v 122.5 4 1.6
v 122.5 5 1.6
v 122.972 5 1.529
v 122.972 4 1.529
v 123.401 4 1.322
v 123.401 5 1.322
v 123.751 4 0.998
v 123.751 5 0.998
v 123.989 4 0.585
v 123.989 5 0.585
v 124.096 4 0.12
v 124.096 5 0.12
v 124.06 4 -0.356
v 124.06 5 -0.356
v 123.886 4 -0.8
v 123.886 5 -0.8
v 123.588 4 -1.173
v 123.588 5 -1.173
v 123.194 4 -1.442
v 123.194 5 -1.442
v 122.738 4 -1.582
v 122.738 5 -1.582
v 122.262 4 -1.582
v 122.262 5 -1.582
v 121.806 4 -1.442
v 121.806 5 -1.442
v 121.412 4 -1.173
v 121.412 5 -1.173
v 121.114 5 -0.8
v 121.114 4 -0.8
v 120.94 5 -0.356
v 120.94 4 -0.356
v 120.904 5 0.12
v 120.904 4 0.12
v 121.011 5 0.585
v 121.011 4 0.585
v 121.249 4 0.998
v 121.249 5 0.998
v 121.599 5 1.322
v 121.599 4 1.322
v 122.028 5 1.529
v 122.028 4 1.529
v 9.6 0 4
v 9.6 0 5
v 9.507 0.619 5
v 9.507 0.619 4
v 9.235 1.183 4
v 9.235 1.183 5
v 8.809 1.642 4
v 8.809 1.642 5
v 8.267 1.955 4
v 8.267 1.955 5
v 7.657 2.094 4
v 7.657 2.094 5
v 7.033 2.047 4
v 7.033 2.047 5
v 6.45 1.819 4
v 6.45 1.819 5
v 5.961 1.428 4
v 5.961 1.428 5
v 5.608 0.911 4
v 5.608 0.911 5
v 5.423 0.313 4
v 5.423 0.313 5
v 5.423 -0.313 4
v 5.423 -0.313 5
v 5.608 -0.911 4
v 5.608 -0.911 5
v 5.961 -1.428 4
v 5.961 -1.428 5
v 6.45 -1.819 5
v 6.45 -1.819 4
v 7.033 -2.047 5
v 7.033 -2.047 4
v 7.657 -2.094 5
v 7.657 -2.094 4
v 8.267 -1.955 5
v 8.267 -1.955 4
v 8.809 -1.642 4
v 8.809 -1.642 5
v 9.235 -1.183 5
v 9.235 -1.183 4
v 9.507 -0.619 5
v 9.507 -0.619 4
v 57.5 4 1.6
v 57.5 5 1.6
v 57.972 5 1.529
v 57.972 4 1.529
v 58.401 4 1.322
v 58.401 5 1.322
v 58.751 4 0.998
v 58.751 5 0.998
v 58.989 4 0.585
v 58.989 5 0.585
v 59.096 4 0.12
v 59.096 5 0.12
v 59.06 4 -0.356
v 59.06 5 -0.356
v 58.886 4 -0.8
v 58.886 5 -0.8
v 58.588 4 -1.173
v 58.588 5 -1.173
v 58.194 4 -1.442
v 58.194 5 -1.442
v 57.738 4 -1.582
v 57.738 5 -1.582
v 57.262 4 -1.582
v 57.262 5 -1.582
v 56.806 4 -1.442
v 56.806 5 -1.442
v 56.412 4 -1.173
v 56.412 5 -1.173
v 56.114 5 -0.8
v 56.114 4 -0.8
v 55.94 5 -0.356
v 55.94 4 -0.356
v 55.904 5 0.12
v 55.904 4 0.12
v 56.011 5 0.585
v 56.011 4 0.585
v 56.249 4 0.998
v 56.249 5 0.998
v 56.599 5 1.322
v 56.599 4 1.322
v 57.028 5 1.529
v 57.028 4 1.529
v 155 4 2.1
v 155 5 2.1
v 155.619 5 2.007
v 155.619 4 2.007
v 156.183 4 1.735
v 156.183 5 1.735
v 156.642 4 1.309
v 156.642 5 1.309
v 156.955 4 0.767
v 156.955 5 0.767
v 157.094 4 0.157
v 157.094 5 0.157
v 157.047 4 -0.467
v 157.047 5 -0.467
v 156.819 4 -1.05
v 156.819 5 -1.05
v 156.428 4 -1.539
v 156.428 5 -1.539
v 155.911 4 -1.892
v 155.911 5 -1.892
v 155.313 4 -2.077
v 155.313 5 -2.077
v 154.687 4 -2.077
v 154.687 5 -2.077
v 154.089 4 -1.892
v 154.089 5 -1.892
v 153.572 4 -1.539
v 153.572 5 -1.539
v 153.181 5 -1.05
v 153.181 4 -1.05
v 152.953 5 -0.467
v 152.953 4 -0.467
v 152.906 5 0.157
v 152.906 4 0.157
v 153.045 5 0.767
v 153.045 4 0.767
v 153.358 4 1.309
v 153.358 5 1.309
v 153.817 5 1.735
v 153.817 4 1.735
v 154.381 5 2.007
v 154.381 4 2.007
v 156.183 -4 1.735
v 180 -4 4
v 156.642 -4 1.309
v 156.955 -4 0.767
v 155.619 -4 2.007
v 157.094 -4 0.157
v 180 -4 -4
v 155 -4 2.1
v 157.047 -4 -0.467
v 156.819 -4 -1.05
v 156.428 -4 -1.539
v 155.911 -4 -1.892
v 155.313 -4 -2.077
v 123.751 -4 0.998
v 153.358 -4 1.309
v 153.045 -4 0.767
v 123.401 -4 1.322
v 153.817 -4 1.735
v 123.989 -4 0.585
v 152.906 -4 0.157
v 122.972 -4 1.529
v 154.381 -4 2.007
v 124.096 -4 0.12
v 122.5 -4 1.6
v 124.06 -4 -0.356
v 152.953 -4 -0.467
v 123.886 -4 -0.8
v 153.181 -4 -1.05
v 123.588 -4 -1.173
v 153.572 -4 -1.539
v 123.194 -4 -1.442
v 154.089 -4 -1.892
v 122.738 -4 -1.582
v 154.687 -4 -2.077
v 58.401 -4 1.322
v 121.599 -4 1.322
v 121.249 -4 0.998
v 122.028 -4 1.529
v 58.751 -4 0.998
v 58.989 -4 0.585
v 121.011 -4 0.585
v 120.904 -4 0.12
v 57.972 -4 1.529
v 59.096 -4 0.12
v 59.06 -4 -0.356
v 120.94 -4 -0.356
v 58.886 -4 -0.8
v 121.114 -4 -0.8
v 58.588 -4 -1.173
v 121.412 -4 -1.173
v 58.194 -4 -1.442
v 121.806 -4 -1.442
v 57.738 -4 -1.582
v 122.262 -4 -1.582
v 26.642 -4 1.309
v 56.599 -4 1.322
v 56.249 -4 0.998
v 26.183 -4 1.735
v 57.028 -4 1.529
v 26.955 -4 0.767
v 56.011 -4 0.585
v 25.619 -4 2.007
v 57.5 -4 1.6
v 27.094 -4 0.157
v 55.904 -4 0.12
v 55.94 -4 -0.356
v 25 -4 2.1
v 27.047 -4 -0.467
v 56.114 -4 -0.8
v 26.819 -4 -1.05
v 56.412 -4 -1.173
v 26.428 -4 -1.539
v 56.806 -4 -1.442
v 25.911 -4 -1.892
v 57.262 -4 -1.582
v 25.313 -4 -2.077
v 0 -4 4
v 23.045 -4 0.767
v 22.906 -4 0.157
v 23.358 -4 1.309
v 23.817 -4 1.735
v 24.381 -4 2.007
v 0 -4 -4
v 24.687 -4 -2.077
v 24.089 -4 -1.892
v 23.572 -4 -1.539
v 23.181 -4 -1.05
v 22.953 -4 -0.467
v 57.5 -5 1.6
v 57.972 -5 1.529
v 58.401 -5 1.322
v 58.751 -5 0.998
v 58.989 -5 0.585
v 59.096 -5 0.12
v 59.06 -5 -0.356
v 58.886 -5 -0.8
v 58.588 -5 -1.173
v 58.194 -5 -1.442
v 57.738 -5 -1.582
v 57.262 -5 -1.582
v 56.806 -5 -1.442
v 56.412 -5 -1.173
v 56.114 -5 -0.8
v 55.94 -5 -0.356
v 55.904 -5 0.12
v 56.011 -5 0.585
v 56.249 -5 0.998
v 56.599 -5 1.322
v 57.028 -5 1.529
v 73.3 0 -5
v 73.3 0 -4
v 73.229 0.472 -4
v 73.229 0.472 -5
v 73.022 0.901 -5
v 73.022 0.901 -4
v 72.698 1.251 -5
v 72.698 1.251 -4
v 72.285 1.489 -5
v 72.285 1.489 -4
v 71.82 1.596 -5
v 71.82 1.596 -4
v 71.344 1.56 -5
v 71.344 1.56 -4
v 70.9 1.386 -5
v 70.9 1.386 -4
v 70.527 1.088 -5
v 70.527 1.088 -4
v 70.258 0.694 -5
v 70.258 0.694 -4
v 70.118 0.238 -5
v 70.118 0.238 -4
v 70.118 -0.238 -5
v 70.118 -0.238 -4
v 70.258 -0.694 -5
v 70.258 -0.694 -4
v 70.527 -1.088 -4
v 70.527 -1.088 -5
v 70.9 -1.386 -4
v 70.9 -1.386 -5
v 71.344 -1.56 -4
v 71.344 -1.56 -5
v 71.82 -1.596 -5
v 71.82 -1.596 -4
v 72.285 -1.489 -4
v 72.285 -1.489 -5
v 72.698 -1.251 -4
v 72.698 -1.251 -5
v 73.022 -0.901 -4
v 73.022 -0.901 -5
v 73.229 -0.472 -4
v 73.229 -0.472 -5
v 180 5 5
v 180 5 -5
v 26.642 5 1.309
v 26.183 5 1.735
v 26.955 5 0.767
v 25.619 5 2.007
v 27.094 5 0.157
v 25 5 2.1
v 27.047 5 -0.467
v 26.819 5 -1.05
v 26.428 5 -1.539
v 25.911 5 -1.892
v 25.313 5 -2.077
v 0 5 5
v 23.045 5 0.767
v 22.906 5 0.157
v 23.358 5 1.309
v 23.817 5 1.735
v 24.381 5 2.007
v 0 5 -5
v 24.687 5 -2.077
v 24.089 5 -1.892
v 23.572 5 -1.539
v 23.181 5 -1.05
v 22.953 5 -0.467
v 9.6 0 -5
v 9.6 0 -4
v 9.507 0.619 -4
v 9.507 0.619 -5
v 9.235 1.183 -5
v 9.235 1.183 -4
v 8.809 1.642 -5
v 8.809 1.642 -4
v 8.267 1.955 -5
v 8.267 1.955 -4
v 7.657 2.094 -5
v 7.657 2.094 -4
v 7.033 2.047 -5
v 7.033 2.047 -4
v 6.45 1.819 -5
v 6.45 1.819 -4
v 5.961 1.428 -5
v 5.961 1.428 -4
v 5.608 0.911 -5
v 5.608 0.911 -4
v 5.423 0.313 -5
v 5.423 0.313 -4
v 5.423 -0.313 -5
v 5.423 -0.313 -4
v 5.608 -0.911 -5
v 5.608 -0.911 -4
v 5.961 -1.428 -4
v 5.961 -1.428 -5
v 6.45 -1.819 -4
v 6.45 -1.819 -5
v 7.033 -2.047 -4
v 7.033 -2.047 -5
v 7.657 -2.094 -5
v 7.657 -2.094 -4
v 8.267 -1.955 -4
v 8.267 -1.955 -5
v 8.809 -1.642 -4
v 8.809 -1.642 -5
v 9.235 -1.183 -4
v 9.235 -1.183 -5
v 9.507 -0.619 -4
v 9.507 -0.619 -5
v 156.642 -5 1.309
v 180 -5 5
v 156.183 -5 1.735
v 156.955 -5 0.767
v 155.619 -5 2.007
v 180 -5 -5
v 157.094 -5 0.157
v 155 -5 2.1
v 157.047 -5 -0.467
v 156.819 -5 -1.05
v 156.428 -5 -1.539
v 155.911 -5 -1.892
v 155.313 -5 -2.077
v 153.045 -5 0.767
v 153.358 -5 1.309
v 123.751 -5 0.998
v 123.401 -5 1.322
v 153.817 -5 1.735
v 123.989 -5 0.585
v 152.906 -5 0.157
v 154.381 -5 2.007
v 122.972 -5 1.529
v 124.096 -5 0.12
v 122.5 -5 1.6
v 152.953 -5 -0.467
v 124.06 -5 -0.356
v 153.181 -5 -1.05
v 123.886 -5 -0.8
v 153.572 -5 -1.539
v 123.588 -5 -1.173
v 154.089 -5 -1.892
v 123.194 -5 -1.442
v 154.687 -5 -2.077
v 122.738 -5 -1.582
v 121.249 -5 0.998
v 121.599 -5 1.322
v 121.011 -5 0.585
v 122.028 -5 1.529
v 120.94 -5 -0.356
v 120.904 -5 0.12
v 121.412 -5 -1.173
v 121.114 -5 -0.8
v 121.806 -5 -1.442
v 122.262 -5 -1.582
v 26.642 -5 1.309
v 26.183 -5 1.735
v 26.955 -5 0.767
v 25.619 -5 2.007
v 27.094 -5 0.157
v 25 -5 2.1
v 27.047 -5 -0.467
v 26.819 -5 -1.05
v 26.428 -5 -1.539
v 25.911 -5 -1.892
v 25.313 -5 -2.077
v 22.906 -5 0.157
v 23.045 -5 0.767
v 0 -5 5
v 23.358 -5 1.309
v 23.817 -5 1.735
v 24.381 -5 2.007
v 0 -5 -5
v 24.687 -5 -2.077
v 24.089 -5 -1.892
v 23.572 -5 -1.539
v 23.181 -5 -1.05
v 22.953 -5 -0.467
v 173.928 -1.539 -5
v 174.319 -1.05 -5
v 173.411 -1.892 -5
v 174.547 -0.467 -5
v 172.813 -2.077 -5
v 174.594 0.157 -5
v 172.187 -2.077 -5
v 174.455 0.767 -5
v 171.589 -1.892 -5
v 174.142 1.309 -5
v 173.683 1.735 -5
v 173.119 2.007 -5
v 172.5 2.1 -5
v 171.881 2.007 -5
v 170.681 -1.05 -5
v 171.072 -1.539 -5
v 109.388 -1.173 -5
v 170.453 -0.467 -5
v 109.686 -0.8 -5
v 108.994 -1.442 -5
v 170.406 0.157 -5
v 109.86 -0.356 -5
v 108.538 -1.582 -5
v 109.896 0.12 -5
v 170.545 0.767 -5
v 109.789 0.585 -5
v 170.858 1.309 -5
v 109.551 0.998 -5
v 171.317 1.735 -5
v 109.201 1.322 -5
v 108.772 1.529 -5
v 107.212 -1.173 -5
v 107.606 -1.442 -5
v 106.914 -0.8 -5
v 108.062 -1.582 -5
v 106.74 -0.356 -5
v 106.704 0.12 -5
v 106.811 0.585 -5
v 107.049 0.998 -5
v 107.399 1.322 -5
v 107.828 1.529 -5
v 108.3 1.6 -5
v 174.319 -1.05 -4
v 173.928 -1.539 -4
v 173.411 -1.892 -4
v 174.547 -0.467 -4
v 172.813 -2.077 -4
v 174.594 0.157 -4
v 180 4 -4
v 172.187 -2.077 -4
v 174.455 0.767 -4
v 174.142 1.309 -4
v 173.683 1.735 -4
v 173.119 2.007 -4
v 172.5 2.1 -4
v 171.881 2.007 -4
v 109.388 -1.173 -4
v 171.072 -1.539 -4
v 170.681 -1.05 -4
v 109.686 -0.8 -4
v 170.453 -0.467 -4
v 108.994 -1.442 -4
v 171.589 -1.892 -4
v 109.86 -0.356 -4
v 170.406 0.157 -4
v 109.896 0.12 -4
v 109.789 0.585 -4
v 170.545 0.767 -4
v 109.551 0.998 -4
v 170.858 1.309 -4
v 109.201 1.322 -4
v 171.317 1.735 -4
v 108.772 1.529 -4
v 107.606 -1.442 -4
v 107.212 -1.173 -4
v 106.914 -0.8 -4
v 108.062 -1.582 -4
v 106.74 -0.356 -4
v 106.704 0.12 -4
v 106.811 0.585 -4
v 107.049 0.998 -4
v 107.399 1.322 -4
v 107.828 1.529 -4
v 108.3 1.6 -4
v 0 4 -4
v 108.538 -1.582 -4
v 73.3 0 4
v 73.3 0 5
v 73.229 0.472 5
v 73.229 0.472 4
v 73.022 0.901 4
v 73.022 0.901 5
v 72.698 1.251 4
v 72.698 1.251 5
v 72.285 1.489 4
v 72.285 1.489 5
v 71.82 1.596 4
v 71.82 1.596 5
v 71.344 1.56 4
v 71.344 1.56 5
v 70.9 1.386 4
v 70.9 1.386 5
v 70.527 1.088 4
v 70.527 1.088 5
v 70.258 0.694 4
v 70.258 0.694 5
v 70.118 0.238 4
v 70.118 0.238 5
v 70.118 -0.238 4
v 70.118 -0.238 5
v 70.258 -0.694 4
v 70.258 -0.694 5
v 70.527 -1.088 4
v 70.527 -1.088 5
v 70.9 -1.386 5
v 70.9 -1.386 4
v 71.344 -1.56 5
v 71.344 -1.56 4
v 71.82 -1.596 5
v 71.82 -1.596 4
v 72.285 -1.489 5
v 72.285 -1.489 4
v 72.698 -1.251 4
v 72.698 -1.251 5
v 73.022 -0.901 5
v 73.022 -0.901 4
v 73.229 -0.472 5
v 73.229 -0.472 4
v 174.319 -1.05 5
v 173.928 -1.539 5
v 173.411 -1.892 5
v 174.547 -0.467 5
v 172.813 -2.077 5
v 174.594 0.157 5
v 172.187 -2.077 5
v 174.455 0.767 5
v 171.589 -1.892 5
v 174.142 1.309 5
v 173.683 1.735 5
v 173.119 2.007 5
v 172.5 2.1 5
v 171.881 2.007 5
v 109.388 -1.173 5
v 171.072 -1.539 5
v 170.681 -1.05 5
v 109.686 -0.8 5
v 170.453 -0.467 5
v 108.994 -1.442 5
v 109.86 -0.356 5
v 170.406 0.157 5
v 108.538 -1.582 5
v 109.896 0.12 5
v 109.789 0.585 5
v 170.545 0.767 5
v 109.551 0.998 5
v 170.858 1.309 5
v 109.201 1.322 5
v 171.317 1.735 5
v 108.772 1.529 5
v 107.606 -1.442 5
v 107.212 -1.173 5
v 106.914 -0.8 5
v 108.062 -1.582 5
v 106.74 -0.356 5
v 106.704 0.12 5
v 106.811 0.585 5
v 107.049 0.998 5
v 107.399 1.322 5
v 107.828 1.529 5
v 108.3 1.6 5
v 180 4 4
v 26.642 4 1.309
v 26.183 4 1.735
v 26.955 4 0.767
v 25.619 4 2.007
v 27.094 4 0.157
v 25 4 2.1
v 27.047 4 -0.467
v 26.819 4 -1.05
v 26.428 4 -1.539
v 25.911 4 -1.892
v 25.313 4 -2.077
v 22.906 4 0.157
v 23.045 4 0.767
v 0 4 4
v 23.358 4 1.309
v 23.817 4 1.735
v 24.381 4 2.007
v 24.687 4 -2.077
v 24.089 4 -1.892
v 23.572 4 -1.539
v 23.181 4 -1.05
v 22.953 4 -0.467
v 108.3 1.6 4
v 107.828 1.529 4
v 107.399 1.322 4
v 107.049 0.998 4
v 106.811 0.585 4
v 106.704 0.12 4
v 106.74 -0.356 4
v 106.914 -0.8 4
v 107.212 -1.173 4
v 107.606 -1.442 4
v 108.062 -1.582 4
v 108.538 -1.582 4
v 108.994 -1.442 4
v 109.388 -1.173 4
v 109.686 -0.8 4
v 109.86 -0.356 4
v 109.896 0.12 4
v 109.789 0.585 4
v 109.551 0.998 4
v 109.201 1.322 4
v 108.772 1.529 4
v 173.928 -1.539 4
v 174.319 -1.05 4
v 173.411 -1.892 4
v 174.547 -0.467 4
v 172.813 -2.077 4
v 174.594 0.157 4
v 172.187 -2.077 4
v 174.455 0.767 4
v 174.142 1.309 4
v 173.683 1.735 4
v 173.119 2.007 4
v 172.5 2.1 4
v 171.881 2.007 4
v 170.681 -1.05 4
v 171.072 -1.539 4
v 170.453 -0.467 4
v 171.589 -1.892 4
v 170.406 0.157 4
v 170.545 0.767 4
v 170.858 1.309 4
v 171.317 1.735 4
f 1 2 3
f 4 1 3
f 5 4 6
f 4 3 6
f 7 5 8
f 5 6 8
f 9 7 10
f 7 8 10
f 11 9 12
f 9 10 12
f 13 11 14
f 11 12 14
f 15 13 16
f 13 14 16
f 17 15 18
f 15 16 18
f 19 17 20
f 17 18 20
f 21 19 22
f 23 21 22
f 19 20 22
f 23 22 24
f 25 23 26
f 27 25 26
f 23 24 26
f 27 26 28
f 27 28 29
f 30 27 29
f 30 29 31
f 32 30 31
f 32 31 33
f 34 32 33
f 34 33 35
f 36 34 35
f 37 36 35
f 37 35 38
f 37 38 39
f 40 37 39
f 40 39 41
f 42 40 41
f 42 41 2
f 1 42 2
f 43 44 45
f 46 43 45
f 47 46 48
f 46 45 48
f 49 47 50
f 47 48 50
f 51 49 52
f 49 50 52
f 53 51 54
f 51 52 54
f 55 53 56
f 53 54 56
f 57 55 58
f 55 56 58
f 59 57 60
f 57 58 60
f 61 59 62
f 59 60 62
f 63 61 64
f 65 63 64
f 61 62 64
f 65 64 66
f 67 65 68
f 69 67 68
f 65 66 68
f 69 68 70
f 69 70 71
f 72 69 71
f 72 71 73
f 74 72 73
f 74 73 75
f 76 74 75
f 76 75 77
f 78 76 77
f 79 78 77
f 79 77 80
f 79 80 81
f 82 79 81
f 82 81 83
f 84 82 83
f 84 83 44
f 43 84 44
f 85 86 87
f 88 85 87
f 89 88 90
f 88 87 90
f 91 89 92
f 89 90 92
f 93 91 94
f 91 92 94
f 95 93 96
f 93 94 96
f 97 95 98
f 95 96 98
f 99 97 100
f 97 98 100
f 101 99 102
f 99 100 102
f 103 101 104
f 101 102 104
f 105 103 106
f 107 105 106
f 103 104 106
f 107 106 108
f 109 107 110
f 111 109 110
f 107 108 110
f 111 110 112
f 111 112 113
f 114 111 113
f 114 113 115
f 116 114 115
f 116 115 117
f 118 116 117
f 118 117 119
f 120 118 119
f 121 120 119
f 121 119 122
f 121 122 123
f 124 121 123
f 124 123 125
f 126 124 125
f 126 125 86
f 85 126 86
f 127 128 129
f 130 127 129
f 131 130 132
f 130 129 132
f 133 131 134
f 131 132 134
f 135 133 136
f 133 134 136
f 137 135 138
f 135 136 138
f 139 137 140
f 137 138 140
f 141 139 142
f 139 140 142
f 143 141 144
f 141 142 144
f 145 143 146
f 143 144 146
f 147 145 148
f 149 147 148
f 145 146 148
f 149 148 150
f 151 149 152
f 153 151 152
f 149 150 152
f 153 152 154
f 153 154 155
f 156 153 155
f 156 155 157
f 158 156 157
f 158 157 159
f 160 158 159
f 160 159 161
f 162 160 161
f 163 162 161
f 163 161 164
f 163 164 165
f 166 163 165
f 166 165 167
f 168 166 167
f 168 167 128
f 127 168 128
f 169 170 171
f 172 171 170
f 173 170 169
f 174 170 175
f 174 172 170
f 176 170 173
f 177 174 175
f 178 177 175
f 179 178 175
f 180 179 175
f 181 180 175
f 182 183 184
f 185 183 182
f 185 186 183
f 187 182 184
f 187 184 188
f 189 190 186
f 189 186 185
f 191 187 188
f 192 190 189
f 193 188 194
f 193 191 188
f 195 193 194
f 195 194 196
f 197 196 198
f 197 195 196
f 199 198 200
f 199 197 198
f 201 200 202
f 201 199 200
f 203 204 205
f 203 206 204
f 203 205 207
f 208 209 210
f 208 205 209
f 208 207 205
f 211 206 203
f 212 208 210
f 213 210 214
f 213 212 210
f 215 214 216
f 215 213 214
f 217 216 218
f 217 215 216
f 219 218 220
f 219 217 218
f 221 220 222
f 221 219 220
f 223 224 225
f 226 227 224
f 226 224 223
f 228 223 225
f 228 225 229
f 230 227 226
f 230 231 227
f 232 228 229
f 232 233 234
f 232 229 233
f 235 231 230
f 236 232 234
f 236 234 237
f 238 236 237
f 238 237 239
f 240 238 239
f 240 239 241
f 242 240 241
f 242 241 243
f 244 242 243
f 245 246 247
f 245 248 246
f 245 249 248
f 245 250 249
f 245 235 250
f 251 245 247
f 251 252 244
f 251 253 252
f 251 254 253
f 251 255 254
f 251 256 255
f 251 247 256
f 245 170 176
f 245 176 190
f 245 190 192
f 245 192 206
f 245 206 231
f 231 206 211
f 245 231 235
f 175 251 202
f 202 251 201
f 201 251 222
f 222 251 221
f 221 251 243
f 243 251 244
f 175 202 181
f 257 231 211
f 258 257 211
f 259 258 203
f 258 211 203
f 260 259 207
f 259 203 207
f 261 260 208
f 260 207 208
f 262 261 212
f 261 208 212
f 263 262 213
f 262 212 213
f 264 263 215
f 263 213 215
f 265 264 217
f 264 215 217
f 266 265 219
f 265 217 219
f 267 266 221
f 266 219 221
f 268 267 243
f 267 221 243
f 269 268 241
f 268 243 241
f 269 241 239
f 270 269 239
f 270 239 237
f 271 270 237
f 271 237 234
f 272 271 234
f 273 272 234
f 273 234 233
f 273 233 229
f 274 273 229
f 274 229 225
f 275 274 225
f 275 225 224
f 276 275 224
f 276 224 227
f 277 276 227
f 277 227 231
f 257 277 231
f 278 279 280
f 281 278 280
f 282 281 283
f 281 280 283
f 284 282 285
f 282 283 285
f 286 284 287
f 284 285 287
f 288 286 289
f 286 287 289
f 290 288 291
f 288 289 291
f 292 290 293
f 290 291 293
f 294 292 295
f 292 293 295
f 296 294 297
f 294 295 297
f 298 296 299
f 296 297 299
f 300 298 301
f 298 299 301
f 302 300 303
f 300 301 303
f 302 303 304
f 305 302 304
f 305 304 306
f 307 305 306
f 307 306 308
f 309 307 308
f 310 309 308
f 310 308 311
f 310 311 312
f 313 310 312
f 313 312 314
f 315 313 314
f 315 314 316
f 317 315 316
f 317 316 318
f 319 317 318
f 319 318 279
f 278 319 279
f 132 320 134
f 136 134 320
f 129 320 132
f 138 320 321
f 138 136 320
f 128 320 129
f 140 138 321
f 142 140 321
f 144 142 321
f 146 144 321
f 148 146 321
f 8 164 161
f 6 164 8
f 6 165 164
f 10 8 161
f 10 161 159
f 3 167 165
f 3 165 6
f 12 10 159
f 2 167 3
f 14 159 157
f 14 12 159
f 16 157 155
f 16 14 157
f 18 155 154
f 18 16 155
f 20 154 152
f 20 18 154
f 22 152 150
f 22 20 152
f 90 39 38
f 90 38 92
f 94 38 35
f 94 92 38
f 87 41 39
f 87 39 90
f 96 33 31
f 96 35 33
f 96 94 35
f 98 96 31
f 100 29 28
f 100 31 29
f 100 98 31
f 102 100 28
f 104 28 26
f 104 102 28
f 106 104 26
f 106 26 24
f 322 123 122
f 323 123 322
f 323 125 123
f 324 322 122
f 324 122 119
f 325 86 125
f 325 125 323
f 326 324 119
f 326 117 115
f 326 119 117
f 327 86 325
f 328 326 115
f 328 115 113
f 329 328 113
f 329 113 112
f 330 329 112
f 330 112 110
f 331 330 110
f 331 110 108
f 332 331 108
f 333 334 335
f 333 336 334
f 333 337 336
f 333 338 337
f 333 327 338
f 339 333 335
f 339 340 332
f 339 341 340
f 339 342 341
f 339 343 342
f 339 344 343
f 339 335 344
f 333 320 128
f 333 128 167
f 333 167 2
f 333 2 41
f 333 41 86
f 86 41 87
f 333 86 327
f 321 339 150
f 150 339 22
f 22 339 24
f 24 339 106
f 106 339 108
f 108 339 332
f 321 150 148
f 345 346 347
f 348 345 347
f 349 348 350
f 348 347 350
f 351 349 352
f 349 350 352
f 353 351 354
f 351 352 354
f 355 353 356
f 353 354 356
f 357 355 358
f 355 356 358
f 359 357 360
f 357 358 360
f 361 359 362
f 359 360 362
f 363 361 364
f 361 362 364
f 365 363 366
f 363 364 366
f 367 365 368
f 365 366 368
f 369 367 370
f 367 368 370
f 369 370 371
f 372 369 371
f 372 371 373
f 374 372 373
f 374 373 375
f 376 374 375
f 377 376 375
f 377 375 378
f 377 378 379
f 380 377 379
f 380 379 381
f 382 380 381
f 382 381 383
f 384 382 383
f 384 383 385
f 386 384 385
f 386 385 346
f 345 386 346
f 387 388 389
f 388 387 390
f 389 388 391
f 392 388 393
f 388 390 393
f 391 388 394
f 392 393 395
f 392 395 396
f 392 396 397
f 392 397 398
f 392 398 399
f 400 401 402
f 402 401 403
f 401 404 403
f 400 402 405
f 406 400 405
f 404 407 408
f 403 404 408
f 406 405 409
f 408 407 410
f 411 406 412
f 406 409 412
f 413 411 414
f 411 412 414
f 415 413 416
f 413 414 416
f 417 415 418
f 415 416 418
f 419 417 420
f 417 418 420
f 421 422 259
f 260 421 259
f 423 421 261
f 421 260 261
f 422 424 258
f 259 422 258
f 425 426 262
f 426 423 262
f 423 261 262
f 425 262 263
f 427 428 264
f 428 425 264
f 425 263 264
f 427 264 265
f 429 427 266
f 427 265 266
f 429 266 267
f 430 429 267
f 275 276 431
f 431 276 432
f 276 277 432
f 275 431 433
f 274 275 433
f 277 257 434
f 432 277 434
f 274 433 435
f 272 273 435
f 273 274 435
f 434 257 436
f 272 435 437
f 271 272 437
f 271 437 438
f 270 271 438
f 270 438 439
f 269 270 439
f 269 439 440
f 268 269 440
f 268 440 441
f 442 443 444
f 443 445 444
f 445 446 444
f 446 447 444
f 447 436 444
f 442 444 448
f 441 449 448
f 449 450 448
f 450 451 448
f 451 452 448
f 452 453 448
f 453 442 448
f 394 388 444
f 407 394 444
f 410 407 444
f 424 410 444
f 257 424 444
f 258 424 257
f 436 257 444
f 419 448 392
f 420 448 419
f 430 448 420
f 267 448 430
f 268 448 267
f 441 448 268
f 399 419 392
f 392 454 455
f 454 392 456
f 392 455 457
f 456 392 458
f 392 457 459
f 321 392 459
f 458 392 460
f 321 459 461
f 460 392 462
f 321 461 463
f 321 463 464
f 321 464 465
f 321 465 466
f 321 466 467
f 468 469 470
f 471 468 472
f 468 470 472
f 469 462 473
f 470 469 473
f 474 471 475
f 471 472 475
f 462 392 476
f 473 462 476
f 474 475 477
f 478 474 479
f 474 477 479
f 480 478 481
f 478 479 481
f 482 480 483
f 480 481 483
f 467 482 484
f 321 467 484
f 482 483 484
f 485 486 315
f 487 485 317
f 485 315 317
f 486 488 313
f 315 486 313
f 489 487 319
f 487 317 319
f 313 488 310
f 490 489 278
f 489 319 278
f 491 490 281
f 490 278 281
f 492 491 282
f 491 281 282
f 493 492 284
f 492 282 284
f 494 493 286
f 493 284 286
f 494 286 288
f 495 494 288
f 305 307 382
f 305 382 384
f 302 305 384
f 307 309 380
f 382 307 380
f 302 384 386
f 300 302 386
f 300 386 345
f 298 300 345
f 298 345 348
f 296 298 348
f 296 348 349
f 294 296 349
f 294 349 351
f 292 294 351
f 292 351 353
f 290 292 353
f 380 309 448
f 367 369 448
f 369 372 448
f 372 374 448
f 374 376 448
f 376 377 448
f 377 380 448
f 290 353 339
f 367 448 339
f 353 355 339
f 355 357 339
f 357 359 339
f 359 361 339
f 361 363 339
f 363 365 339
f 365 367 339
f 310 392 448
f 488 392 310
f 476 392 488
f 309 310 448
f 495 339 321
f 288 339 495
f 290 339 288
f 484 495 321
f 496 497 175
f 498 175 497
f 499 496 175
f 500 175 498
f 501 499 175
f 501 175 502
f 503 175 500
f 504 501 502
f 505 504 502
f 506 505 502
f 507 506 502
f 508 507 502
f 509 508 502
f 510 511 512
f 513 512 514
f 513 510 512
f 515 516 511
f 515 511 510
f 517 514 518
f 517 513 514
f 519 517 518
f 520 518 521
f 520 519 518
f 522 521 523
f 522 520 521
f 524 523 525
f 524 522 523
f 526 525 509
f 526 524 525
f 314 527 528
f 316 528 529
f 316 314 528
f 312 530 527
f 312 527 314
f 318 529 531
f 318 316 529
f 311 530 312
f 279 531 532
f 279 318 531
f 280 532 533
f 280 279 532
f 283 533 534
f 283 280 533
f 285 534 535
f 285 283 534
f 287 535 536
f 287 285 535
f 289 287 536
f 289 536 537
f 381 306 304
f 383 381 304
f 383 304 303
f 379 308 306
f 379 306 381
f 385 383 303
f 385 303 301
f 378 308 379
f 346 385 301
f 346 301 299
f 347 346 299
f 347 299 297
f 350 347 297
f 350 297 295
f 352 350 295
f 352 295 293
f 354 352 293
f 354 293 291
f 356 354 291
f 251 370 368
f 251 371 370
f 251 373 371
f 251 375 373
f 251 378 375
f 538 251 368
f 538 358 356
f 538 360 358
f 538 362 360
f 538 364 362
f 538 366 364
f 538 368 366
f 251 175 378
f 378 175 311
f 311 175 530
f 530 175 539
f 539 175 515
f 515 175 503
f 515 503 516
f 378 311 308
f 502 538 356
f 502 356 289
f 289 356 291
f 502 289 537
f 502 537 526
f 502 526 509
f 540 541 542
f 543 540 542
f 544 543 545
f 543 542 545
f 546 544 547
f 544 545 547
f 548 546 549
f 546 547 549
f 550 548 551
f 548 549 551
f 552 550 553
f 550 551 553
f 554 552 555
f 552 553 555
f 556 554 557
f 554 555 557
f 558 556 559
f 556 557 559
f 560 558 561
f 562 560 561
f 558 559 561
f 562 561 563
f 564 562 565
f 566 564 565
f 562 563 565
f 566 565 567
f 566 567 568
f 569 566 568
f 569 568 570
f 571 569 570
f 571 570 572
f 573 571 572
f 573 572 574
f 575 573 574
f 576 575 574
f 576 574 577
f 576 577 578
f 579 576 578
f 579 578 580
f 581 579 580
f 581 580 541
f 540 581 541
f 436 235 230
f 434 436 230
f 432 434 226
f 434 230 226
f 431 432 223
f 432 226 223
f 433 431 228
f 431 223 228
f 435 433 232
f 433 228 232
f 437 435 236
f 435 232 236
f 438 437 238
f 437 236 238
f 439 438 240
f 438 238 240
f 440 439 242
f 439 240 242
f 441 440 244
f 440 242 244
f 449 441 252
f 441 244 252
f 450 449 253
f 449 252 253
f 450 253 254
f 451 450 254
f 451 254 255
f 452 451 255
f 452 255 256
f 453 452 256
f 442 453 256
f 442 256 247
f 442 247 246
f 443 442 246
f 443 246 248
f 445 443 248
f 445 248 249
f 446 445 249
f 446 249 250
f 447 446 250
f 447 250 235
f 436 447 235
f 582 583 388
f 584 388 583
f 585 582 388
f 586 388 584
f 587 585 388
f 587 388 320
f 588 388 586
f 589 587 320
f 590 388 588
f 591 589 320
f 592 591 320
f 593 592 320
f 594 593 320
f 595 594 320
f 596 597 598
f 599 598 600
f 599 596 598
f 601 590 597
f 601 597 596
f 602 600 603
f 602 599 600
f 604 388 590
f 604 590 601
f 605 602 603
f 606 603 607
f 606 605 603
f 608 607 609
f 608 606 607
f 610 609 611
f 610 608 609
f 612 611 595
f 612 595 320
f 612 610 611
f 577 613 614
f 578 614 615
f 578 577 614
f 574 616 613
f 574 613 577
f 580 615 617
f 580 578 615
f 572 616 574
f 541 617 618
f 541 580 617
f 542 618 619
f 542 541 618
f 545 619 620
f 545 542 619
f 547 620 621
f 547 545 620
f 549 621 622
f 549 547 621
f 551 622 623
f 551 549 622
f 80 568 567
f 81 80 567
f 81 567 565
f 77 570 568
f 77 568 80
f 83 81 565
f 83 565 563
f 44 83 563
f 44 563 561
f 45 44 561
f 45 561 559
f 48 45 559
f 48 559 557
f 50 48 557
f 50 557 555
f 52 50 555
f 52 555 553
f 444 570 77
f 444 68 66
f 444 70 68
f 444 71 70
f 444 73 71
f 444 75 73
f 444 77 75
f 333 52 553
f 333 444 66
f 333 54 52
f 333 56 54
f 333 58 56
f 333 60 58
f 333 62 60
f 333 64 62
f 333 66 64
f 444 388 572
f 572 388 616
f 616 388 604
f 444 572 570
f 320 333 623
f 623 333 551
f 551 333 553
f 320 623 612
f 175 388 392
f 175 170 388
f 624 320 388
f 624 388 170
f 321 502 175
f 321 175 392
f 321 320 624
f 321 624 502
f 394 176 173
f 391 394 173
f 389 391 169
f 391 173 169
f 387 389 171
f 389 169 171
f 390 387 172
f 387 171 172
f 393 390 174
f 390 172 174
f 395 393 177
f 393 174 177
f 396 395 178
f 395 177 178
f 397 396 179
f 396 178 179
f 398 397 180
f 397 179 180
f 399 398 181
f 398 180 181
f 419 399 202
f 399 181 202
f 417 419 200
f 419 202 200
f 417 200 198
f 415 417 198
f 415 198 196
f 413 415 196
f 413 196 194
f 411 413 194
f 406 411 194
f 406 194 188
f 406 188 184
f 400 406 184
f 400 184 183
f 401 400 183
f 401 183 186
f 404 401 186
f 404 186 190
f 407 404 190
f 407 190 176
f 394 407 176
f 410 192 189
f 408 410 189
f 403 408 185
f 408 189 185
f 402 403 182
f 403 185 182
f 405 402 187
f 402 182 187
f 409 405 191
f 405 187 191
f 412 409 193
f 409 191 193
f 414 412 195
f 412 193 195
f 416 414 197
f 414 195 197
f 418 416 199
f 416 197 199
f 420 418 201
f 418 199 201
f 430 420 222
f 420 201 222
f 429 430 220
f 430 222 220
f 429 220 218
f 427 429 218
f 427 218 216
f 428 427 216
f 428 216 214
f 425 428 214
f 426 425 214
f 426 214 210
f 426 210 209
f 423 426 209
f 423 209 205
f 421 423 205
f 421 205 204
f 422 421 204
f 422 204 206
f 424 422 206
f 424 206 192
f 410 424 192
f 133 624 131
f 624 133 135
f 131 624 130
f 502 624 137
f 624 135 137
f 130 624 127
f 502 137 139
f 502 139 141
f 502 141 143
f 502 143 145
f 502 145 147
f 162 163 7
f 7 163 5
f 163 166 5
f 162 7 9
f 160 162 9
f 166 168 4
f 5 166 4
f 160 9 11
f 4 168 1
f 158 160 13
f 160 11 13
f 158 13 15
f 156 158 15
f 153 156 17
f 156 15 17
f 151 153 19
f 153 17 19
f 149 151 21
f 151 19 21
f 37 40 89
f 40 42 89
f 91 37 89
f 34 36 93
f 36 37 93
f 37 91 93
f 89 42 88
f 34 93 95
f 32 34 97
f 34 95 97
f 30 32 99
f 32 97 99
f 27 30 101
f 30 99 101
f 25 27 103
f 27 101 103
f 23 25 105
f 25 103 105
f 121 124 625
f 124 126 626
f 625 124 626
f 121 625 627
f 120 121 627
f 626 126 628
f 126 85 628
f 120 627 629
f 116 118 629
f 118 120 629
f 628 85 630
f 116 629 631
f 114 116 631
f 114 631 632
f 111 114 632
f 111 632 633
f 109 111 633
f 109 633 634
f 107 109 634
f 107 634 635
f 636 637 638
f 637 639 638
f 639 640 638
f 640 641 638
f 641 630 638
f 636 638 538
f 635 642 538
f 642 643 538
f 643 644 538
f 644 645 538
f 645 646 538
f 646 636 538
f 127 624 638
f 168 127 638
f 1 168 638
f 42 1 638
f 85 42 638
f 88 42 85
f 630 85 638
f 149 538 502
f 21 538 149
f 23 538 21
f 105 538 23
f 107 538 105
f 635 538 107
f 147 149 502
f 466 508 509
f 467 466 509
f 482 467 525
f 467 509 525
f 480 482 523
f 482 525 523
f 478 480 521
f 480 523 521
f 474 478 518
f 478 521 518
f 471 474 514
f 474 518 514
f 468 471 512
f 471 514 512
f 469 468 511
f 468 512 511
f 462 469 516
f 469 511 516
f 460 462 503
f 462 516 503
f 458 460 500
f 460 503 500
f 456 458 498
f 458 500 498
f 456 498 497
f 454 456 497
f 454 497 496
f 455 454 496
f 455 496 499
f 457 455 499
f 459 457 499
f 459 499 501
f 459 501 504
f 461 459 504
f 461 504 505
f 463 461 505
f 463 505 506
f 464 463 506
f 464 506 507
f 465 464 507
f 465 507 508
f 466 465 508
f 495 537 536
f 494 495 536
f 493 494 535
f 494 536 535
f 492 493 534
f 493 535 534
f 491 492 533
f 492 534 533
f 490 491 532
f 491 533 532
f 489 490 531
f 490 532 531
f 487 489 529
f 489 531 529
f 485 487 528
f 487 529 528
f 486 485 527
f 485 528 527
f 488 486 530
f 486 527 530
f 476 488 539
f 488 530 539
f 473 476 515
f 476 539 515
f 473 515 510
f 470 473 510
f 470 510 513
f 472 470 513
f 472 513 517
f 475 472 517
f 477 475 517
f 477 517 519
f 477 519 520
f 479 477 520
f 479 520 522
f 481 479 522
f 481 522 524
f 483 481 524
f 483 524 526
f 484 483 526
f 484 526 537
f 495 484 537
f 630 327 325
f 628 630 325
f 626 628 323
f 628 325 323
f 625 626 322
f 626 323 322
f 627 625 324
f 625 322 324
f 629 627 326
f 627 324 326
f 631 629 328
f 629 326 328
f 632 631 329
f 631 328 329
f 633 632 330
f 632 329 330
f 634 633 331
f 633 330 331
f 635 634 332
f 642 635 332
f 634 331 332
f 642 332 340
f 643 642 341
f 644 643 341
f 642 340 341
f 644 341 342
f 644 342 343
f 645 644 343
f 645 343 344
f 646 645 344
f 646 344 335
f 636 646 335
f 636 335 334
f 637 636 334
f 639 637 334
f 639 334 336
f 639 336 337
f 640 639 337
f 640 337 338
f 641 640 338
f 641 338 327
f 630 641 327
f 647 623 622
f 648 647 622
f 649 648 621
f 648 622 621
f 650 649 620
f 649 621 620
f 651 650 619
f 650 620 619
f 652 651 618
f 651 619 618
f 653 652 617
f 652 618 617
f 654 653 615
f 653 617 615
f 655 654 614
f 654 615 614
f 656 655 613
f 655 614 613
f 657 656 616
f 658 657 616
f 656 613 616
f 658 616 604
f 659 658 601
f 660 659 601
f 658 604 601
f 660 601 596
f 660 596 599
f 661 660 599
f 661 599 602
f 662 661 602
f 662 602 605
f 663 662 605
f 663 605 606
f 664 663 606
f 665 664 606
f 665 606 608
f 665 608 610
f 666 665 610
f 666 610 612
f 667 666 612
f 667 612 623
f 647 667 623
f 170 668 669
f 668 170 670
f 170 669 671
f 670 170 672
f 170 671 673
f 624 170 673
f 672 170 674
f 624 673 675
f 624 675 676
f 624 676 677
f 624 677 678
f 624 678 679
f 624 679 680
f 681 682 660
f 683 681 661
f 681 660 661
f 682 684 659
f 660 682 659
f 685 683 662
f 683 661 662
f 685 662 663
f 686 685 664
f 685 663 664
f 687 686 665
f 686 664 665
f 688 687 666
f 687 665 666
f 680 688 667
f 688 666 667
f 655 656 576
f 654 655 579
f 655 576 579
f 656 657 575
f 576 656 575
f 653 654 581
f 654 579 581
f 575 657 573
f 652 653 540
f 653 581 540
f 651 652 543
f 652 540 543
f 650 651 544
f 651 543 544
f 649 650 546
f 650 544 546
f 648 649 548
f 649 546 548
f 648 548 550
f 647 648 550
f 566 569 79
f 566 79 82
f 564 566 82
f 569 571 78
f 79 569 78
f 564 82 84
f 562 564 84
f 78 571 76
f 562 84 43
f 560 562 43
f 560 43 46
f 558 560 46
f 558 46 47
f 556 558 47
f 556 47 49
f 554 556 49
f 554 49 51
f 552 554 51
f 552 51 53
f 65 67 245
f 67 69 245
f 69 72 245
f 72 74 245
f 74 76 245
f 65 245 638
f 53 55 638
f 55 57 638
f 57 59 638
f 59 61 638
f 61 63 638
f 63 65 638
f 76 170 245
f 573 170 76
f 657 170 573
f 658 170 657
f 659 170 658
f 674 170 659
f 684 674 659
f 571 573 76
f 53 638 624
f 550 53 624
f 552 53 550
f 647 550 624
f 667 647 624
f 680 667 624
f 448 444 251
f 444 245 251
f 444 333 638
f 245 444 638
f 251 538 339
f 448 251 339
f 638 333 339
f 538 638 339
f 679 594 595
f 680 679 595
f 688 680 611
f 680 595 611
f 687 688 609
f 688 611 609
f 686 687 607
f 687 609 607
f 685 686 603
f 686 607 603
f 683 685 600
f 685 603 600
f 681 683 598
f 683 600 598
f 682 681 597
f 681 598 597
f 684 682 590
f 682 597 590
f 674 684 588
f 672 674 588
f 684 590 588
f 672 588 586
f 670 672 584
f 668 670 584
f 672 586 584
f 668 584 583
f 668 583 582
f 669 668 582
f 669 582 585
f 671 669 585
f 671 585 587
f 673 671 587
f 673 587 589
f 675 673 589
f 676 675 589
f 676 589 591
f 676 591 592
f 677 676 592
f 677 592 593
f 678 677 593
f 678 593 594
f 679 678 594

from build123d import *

# Parameters (mm, degrees)
SKETCH_1_W          = 10
SKETCH_1_H          = 10
SKETCH_1_W_2        = 8
SKETCH_1_H_2        = 8
EXTRUDE_1_DEPTH     = 180
SKETCH_2_R          = 2.1
CUT_EXTRUDE_1_DEPTH = 181.346887969
SKETCH_3_R          = 2.1
CUT_EXTRUDE_2_DEPTH = 181.346887969
SKETCH_4_R          = 1.6
CUT_EXTRUDE_3_DEPTH = 181.346887969
SKETCH_5_R          = 1.6
CUT_EXTRUDE_4_DEPTH = 181.346887969


with BuildPart() as part:
    # ｽｹｯﾁ1 → 押し出し-薄板1 (new body)
    with BuildSketch(Plane(origin=(0, 0, 0), x_dir=(0, 0, -1), z_dir=(1, 0, 0))):
        Rectangle(SKETCH_1_W, SKETCH_1_H)
        Rectangle(SKETCH_1_W_2, SKETCH_1_H_2, mode=Mode.SUBTRACT)
    extrude(amount=EXTRUDE_1_DEPTH)

    # ｽｹｯﾁ2 → ｶｯﾄ - 押し出し1 (cut, through all)
    with BuildSketch(Plane.XY.offset(5)):
        with Locations((7.5, 0)):
            Circle(SKETCH_2_R)
        with Locations(Location((172.5, 0, 0), (0, 0, 90))):
            Circle(SKETCH_2_R)
    extrude(amount=-CUT_EXTRUDE_1_DEPTH, mode=Mode.SUBTRACT)

    # ｽｹｯﾁ3 → ｶｯﾄ - 押し出し2 (cut, through all)
    with BuildSketch(Plane(origin=(0, 5, 0), x_dir=(1, 0, 0), z_dir=(0, 1, 0))):
        with Locations(Location((25, 0, 0), (0, 0, 270))):
            Circle(SKETCH_3_R)
        with Locations(Location((155, 0, 0), (0, 0, 270))):
            Circle(SKETCH_3_R)
    extrude(amount=-CUT_EXTRUDE_2_DEPTH, mode=Mode.SUBTRACT)

    # ｽｹｯﾁ4 → ｶｯﾄ - 押し出し3 (cut, through all)
    with BuildSketch(Plane.XY.offset(5)):
        with Locations((71.7, 0)):
            Circle(SKETCH_4_R)
        with Locations(Location((108.3, 0, 0), (0, 0, 90))):
            Circle(SKETCH_4_R)
    extrude(amount=-CUT_EXTRUDE_3_DEPTH, mode=Mode.SUBTRACT)

    # ｽｹｯﾁ5 → ｶｯﾄ - 押し出し4 (cut, through all)
    with BuildSketch(Plane(origin=(0, 5, 0), x_dir=(1, 0, 0), z_dir=(0, 1, 0))):
        with Locations(Location((57.5, 0, 0), (0, 0, 270))):
            Circle(SKETCH_5_R)
        with Locations(Location((122.5, 0, 0), (0, 0, 270))):
            Circle(SKETCH_5_R)
    extrude(amount=-CUT_EXTRUDE_4_DEPTH, mode=Mode.SUBTRACT)


solid = part.part
